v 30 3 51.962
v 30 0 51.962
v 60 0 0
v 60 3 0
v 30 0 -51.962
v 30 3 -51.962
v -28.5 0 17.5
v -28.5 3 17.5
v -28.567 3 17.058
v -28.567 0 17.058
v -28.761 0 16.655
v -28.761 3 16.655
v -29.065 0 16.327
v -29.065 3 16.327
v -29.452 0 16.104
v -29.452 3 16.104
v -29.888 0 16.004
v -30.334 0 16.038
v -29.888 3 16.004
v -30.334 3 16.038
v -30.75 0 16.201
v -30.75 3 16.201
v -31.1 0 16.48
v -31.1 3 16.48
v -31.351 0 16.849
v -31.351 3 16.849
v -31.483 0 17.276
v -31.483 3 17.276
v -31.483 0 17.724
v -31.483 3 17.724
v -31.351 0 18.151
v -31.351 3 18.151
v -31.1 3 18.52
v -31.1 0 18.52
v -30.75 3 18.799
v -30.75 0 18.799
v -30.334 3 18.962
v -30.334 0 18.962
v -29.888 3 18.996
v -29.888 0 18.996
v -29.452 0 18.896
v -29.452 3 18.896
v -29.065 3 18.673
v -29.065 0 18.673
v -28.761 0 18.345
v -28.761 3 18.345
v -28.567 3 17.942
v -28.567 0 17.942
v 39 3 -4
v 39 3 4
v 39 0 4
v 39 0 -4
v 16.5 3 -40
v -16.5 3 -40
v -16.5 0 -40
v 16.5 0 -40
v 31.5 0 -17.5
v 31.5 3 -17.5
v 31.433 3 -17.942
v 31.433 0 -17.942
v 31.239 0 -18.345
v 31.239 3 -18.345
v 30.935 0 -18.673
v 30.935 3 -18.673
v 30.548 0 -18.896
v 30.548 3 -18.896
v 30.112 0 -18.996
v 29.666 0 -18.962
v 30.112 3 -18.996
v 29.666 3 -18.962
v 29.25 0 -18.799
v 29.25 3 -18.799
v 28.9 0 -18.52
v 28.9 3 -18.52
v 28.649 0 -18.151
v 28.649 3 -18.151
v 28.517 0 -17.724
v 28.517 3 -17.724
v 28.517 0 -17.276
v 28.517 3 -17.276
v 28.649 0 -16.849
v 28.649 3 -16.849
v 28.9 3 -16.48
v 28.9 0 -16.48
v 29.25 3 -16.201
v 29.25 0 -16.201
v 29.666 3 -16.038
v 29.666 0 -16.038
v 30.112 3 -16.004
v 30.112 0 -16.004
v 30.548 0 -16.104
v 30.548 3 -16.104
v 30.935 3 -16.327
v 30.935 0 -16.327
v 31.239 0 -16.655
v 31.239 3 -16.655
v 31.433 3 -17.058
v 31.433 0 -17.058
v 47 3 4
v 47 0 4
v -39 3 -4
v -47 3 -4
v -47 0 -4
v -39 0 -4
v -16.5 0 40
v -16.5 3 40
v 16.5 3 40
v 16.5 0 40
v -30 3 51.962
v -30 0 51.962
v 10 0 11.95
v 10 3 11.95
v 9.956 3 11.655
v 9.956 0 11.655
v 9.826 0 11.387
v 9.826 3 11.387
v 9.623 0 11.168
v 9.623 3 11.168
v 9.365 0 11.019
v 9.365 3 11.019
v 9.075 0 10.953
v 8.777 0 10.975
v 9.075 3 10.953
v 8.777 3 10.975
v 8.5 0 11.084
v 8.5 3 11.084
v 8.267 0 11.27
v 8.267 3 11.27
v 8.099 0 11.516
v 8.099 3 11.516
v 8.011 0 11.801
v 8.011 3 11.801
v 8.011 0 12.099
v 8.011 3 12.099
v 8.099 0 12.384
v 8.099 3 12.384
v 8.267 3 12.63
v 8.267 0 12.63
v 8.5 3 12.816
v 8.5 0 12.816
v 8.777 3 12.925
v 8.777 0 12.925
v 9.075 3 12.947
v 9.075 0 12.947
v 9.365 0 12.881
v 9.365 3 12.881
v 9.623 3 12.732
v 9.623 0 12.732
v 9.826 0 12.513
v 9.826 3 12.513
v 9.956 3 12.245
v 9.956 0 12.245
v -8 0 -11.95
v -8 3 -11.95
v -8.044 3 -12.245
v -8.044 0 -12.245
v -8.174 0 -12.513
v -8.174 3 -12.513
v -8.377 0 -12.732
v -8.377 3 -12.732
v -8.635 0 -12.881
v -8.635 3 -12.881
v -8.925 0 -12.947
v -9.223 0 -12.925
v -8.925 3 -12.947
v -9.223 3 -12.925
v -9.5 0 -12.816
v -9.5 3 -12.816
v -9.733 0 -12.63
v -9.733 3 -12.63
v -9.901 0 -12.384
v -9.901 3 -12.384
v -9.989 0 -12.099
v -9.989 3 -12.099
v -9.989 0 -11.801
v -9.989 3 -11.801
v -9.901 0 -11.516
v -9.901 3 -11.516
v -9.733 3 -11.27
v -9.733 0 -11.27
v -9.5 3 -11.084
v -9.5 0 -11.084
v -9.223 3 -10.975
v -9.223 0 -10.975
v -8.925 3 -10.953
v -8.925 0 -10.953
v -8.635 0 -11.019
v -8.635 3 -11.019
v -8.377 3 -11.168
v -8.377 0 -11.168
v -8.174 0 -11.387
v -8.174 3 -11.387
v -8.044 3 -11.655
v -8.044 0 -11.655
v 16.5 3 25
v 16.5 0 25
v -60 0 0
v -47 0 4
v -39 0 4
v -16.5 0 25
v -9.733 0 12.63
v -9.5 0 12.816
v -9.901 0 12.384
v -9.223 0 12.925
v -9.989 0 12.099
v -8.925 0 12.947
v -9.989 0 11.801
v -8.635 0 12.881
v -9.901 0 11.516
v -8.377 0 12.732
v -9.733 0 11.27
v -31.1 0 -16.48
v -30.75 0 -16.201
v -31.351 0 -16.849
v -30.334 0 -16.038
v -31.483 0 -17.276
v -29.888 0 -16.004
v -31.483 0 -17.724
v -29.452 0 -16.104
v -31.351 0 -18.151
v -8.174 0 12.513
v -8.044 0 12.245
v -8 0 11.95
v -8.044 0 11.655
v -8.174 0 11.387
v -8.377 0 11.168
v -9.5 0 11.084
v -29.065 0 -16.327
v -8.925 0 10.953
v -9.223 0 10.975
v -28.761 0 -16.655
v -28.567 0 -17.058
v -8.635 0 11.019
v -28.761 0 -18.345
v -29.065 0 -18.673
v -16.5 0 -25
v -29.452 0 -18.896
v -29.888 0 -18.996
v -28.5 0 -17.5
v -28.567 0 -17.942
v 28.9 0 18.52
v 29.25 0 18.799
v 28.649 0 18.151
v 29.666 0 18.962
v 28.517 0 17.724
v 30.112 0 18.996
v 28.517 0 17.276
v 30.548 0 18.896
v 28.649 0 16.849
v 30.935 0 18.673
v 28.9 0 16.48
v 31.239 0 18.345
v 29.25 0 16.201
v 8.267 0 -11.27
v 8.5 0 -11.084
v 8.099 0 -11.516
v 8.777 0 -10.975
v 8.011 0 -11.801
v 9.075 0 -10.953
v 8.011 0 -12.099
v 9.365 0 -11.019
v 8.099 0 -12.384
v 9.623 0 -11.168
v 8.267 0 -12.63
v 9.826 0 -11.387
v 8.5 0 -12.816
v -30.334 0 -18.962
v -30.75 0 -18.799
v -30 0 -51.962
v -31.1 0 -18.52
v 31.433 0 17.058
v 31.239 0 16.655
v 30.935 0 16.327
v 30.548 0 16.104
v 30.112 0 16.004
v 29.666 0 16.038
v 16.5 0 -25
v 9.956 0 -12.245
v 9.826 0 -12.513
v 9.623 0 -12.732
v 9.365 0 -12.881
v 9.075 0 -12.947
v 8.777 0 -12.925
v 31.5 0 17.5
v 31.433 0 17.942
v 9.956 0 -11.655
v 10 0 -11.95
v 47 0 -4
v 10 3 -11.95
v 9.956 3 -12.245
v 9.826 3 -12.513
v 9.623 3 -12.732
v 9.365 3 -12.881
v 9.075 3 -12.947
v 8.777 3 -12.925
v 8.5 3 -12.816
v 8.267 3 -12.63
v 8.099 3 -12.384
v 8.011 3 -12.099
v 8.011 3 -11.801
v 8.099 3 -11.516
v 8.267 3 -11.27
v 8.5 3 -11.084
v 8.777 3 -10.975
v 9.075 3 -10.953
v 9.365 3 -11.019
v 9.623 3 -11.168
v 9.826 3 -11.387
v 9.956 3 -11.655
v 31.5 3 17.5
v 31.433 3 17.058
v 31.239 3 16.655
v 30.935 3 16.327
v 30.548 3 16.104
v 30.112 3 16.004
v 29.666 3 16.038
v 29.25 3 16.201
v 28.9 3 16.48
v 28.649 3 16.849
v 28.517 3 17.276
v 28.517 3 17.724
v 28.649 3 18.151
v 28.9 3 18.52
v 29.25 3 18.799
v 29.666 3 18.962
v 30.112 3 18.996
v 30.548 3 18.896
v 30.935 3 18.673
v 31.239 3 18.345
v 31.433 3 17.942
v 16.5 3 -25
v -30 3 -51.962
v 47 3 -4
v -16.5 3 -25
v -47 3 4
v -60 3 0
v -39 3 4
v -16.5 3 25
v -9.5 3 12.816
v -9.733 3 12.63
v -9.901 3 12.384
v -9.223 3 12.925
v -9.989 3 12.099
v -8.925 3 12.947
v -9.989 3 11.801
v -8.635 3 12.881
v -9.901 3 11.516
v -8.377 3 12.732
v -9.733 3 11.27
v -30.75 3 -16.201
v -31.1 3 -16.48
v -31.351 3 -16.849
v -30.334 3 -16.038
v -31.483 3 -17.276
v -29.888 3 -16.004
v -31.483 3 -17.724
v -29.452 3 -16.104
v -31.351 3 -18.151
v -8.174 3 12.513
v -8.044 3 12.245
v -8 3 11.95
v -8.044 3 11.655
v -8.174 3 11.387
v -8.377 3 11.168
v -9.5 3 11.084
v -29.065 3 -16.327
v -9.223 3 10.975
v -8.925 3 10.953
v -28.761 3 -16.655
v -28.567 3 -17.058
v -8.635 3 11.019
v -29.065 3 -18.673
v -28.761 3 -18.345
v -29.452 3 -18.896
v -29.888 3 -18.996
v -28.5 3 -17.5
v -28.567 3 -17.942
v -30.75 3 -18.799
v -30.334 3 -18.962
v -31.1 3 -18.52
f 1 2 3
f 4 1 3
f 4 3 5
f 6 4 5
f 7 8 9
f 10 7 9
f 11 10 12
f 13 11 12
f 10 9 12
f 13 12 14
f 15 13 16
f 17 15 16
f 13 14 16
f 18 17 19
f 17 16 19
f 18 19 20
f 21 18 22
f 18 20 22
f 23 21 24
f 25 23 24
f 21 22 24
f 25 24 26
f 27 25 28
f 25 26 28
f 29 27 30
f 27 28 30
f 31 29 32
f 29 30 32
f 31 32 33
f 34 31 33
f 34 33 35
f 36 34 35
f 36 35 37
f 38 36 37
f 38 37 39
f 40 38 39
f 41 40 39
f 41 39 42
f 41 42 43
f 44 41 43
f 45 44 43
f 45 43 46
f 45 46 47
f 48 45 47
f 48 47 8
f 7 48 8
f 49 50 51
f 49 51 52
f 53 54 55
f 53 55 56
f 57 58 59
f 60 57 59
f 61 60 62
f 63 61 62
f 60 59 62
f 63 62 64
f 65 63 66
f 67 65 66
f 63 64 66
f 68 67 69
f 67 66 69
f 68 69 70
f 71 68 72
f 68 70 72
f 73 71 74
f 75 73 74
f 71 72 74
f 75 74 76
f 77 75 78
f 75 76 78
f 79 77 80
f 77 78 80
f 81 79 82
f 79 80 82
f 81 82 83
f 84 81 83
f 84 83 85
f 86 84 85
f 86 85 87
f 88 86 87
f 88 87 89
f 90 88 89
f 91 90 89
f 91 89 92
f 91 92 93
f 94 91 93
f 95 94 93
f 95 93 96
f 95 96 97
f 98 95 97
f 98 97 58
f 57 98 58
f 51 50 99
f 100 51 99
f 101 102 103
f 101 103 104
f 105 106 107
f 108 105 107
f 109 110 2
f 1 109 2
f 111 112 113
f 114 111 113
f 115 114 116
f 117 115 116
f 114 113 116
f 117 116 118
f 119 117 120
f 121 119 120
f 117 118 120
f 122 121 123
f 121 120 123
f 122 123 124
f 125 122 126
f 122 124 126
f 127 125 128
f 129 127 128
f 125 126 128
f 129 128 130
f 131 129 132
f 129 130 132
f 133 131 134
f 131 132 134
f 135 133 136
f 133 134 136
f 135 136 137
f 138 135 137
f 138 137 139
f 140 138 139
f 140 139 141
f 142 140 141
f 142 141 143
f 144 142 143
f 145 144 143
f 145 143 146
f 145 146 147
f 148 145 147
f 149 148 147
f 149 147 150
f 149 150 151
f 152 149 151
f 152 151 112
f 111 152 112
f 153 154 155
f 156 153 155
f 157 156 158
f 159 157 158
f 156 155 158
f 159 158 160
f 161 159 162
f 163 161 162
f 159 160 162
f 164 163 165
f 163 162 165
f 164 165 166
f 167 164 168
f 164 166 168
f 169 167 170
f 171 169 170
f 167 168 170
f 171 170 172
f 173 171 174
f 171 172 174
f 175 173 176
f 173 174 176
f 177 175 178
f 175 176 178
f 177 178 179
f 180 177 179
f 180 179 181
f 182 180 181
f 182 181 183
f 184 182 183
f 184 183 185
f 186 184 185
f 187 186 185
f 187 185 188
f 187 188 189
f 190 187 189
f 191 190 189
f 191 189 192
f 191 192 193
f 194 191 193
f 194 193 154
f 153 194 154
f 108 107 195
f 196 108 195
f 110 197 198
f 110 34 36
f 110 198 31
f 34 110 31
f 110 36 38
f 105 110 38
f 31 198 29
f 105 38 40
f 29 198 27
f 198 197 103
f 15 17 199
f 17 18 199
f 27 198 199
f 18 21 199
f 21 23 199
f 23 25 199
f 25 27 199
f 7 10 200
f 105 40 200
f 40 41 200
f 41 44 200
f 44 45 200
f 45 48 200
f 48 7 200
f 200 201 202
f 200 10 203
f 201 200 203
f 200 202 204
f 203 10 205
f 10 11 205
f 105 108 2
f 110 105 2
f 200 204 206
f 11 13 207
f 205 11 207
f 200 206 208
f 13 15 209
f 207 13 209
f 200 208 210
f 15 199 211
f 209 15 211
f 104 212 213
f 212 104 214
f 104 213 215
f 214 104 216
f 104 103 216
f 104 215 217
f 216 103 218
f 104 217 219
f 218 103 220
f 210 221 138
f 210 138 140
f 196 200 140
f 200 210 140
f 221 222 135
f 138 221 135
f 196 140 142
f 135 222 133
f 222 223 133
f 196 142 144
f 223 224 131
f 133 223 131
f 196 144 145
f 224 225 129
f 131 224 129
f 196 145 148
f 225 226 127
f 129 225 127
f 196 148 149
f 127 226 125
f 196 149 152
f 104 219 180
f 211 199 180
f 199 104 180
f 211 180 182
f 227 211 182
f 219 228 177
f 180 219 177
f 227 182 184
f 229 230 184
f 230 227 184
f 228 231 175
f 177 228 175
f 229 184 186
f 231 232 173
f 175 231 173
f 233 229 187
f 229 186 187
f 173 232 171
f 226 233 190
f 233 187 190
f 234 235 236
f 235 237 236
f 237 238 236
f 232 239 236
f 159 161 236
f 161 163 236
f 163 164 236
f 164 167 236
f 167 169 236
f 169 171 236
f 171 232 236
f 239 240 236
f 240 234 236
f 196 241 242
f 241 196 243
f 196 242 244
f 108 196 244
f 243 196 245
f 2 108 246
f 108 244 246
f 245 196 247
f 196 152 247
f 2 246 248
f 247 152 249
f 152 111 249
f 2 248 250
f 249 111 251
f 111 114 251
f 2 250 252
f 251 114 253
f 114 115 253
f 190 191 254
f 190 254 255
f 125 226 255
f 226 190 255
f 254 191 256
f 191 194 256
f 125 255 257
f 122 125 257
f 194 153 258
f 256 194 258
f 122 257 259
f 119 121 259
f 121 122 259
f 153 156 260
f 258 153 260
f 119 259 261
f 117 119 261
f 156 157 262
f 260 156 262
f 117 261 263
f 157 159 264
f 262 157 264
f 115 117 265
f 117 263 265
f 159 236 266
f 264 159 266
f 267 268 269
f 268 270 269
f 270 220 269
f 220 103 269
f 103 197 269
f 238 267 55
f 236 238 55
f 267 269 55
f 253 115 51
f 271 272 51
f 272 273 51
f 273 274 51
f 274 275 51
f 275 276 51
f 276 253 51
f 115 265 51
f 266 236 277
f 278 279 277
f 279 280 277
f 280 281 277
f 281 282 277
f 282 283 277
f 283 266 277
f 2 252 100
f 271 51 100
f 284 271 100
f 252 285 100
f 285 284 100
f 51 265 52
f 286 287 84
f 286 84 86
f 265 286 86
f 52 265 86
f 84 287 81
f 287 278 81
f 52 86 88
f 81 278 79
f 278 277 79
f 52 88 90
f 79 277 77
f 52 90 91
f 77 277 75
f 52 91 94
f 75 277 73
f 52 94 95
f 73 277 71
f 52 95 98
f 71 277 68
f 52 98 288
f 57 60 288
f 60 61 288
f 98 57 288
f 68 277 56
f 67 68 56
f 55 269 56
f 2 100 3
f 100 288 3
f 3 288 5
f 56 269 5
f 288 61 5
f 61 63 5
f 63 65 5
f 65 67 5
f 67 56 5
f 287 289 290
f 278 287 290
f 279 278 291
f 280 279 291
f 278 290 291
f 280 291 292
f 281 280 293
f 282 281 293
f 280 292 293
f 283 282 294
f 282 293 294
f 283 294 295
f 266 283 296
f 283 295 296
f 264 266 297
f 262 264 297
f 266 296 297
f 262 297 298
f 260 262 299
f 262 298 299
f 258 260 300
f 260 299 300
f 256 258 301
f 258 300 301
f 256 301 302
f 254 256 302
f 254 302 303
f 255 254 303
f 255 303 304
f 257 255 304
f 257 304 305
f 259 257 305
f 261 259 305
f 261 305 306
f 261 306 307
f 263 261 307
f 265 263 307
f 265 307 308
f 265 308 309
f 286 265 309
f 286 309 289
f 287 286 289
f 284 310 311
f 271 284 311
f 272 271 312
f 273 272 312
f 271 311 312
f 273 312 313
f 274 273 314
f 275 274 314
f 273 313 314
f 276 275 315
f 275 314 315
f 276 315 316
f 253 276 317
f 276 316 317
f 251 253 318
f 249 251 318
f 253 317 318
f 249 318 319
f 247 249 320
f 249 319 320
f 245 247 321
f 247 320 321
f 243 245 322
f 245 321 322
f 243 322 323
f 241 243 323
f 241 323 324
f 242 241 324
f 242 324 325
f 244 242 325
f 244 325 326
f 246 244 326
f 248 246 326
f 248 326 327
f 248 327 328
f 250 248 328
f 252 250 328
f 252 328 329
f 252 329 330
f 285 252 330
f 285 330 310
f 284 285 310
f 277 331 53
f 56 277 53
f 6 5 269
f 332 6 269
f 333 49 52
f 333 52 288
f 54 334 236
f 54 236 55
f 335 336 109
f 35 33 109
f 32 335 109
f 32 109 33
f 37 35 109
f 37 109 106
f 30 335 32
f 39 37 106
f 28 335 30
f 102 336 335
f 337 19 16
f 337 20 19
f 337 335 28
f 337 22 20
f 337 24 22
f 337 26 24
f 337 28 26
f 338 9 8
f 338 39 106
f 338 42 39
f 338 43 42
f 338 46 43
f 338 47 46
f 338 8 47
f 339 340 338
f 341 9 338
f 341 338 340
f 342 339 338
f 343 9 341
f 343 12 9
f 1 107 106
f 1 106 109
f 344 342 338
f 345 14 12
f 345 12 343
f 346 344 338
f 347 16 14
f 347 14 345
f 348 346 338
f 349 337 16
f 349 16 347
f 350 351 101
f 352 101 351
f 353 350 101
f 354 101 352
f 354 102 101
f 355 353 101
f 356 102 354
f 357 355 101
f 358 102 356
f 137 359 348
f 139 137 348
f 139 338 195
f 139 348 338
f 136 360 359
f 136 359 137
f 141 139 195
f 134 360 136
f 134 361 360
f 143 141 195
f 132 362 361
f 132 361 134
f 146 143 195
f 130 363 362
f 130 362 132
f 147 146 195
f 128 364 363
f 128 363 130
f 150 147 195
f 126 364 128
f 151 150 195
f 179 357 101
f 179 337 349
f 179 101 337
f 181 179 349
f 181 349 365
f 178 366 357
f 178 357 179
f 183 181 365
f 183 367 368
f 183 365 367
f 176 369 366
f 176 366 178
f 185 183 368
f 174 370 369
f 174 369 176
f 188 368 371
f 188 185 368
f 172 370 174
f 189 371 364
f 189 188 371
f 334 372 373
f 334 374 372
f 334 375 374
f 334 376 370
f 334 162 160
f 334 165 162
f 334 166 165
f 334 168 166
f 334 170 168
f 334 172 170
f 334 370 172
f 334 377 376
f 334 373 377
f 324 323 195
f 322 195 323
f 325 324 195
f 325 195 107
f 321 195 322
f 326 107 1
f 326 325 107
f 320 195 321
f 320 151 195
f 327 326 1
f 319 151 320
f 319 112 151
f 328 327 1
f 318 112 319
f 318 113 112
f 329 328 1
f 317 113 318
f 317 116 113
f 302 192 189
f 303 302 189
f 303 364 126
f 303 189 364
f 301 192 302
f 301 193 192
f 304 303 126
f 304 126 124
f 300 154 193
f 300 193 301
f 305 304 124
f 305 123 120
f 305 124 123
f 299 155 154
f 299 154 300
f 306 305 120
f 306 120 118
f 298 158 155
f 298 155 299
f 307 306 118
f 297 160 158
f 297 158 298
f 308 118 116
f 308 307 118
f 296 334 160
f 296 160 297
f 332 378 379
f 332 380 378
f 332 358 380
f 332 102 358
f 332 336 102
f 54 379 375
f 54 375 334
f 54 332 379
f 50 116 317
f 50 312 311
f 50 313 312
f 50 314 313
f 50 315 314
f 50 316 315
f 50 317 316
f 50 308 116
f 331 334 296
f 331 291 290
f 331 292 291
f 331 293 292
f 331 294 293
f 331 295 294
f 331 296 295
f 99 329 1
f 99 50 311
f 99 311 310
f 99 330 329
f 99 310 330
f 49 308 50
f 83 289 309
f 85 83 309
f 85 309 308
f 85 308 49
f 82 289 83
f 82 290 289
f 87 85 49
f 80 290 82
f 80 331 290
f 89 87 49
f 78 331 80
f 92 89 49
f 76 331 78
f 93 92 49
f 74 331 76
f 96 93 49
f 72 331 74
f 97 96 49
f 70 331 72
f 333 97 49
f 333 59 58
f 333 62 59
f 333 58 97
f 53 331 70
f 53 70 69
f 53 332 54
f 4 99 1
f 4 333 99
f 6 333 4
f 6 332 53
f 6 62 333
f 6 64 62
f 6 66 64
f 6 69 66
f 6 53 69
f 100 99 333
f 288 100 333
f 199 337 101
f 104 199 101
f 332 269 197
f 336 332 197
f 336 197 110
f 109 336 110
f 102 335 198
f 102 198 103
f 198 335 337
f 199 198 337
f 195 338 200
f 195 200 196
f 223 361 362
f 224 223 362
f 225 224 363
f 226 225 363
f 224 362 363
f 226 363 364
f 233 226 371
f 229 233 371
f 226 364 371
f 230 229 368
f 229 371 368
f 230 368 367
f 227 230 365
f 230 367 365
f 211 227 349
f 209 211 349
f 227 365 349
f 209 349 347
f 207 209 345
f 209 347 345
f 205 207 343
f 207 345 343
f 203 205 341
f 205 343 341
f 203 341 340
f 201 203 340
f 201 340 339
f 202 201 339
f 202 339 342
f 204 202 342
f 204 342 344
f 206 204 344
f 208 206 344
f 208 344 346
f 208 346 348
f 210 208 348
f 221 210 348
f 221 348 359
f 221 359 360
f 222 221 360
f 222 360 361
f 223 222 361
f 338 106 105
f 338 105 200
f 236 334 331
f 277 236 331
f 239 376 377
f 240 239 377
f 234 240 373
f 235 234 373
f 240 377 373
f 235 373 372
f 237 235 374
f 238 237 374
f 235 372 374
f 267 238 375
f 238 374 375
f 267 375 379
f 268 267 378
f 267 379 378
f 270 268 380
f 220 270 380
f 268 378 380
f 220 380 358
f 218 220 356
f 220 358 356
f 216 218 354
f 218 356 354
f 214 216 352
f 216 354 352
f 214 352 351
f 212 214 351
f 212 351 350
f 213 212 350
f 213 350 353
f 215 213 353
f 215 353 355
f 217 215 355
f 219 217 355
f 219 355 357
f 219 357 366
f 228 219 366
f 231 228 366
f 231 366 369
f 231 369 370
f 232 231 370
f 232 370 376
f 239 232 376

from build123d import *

# Parameters (mm, degrees)
SALIENTE_EXTRUIR1_DEPTH = 3
CROQUIS3_W              = 33
CROQUIS3_H              = 15
CORTAR_EXTRUIR1_DEPTH   = 4
CROQUIS4_R              = 1
CORTAR_EXTRUIR2_DEPTH   = 4
CROQUIS5_W              = 8
CROQUIS5_H              = 8
CORTAR_EXTRUIR3_DEPTH   = 4
CROQUIS6_R              = 1.5
CORTAR_EXTRUIR4_DEPTH   = 4


with BuildPart() as part:
    # Croquis1 → Saliente-Extruir1 (new body)
    with BuildSketch(Plane(origin=(0, 0, 0), x_dir=(1, 0, 0), z_dir=(0, 1, 0))):
        Polygon((-60, 0), (-30, -51.961524227), (30, -51.961524227), (60, 0), (30, 51.961524227), (-30, 51.961524227), align=None)
    extrude(amount=SALIENTE_EXTRUIR1_DEPTH)

    # Croquis3 → Cortar-Extruir1 (cut, through all)
    with BuildSketch(Plane(origin=(0, 3, 0), x_dir=(1, 0, 0), z_dir=(0, 1, 0))):
        with Locations((0, -32.5)):
            Rectangle(CROQUIS3_W, CROQUIS3_H)
        with Locations((0, 32.5)):
            Rectangle(CROQUIS3_W, CROQUIS3_H)
    extrude(amount=-CORTAR_EXTRUIR1_DEPTH, mode=Mode.SUBTRACT)

    # Croquis4 → Cortar-Extruir2 (cut, through all)
    with BuildSketch(Plane(origin=(0, 3, 0), x_dir=(1, 0, 0), z_dir=(0, 1, 0))):
        with Locations((-9, -11.95)):
            Circle(CROQUIS4_R)
        with Locations((9, -11.95)):
            Circle(CROQUIS4_R)
        with Locations((9, 11.95)):
            Circle(CROQUIS4_R)
        with Locations((-9, 11.95)):
            Circle(CROQUIS4_R)
    extrude(amount=-CORTAR_EXTRUIR2_DEPTH, mode=Mode.SUBTRACT)

    # Croquis5 → Cortar-Extruir3 (cut, through all)
    with BuildSketch(Plane(origin=(0, 3, 0), x_dir=(1, 0, 0), z_dir=(0, 1, 0))):
        with Locations((-43, 0)):
            Rectangle(CROQUIS5_W, CROQUIS5_H)
        with Locations((43, 0)):
            Rectangle(CROQUIS5_W, CROQUIS5_H)
    extrude(amount=-CORTAR_EXTRUIR3_DEPTH, mode=Mode.SUBTRACT)

    # Croquis6 → Cortar-Extruir4 (cut, through all)
    with BuildSketch(Plane(origin=(0, 3, 0), x_dir=(1, 0, 0), z_dir=(0, 1, 0))):
        with Locations((-30, -17.5)):
            Circle(CROQUIS6_R)
        with Locations((-30, 17.5)):
            Circle(CROQUIS6_R)
        with Locations((30, 17.5)):
            Circle(CROQUIS6_R)
        with Locations((30, -17.5)):
            Circle(CROQUIS6_R)
    extrude(amount=-CORTAR_EXTRUIR4_DEPTH, mode=Mode.SUBTRACT)


solid = part.part
